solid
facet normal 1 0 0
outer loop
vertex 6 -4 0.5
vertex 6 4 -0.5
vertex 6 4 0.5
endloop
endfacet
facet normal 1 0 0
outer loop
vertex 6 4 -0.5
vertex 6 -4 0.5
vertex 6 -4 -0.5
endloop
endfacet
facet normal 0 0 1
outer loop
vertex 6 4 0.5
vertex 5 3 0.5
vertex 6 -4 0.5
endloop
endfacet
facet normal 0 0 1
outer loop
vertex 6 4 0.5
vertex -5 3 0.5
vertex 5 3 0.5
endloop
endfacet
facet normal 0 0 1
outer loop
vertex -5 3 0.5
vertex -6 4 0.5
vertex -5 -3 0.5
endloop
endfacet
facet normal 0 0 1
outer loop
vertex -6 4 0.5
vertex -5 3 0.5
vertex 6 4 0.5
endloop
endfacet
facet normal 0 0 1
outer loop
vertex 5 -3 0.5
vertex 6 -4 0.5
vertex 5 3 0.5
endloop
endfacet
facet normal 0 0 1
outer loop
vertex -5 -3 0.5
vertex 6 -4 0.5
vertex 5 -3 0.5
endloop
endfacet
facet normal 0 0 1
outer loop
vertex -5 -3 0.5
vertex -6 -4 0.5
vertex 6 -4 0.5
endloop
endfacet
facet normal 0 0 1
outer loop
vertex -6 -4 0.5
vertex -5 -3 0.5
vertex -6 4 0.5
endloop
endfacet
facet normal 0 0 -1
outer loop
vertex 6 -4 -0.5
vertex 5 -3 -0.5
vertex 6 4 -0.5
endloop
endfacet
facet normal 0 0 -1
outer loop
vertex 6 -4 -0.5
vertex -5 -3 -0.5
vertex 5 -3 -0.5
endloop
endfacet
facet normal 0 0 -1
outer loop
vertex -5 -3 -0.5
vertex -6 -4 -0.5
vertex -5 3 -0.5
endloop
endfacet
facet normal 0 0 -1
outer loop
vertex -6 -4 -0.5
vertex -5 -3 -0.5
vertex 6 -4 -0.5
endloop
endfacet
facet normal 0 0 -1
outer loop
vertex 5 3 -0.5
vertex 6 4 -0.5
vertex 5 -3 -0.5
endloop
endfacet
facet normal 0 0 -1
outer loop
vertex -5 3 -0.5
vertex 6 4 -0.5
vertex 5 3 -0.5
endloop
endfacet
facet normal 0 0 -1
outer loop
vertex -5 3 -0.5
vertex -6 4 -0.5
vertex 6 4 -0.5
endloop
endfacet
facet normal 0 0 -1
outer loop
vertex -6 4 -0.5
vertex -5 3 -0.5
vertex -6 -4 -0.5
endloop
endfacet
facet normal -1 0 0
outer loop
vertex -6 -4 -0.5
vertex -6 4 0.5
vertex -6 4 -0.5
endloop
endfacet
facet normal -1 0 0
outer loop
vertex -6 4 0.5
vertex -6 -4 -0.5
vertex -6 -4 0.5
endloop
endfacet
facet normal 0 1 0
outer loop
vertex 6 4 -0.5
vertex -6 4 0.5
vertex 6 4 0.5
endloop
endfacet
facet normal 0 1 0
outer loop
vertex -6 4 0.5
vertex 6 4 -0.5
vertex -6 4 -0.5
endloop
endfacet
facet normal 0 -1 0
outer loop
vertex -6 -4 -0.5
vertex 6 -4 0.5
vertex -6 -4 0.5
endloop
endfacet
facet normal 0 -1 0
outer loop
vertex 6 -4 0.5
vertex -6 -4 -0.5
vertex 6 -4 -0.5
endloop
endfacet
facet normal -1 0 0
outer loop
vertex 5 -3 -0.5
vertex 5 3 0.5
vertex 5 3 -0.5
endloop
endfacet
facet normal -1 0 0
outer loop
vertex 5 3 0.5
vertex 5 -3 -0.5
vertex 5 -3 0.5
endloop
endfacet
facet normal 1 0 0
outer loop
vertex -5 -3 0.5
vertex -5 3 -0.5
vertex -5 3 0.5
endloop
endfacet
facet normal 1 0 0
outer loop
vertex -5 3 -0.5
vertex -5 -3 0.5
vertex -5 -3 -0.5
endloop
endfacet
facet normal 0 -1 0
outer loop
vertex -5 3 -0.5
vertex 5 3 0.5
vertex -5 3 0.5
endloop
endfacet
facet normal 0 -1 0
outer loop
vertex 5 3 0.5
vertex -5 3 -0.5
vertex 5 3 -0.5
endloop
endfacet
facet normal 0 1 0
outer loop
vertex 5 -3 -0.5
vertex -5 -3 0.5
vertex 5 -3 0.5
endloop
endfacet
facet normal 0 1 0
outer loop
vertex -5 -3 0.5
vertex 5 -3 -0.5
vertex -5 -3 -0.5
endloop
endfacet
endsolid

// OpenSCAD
difference() {
    cube([12, 8, 1], center=true);
    translate([0, 0, -0.5])
        cube([10, 6, 2], center=true);
}
